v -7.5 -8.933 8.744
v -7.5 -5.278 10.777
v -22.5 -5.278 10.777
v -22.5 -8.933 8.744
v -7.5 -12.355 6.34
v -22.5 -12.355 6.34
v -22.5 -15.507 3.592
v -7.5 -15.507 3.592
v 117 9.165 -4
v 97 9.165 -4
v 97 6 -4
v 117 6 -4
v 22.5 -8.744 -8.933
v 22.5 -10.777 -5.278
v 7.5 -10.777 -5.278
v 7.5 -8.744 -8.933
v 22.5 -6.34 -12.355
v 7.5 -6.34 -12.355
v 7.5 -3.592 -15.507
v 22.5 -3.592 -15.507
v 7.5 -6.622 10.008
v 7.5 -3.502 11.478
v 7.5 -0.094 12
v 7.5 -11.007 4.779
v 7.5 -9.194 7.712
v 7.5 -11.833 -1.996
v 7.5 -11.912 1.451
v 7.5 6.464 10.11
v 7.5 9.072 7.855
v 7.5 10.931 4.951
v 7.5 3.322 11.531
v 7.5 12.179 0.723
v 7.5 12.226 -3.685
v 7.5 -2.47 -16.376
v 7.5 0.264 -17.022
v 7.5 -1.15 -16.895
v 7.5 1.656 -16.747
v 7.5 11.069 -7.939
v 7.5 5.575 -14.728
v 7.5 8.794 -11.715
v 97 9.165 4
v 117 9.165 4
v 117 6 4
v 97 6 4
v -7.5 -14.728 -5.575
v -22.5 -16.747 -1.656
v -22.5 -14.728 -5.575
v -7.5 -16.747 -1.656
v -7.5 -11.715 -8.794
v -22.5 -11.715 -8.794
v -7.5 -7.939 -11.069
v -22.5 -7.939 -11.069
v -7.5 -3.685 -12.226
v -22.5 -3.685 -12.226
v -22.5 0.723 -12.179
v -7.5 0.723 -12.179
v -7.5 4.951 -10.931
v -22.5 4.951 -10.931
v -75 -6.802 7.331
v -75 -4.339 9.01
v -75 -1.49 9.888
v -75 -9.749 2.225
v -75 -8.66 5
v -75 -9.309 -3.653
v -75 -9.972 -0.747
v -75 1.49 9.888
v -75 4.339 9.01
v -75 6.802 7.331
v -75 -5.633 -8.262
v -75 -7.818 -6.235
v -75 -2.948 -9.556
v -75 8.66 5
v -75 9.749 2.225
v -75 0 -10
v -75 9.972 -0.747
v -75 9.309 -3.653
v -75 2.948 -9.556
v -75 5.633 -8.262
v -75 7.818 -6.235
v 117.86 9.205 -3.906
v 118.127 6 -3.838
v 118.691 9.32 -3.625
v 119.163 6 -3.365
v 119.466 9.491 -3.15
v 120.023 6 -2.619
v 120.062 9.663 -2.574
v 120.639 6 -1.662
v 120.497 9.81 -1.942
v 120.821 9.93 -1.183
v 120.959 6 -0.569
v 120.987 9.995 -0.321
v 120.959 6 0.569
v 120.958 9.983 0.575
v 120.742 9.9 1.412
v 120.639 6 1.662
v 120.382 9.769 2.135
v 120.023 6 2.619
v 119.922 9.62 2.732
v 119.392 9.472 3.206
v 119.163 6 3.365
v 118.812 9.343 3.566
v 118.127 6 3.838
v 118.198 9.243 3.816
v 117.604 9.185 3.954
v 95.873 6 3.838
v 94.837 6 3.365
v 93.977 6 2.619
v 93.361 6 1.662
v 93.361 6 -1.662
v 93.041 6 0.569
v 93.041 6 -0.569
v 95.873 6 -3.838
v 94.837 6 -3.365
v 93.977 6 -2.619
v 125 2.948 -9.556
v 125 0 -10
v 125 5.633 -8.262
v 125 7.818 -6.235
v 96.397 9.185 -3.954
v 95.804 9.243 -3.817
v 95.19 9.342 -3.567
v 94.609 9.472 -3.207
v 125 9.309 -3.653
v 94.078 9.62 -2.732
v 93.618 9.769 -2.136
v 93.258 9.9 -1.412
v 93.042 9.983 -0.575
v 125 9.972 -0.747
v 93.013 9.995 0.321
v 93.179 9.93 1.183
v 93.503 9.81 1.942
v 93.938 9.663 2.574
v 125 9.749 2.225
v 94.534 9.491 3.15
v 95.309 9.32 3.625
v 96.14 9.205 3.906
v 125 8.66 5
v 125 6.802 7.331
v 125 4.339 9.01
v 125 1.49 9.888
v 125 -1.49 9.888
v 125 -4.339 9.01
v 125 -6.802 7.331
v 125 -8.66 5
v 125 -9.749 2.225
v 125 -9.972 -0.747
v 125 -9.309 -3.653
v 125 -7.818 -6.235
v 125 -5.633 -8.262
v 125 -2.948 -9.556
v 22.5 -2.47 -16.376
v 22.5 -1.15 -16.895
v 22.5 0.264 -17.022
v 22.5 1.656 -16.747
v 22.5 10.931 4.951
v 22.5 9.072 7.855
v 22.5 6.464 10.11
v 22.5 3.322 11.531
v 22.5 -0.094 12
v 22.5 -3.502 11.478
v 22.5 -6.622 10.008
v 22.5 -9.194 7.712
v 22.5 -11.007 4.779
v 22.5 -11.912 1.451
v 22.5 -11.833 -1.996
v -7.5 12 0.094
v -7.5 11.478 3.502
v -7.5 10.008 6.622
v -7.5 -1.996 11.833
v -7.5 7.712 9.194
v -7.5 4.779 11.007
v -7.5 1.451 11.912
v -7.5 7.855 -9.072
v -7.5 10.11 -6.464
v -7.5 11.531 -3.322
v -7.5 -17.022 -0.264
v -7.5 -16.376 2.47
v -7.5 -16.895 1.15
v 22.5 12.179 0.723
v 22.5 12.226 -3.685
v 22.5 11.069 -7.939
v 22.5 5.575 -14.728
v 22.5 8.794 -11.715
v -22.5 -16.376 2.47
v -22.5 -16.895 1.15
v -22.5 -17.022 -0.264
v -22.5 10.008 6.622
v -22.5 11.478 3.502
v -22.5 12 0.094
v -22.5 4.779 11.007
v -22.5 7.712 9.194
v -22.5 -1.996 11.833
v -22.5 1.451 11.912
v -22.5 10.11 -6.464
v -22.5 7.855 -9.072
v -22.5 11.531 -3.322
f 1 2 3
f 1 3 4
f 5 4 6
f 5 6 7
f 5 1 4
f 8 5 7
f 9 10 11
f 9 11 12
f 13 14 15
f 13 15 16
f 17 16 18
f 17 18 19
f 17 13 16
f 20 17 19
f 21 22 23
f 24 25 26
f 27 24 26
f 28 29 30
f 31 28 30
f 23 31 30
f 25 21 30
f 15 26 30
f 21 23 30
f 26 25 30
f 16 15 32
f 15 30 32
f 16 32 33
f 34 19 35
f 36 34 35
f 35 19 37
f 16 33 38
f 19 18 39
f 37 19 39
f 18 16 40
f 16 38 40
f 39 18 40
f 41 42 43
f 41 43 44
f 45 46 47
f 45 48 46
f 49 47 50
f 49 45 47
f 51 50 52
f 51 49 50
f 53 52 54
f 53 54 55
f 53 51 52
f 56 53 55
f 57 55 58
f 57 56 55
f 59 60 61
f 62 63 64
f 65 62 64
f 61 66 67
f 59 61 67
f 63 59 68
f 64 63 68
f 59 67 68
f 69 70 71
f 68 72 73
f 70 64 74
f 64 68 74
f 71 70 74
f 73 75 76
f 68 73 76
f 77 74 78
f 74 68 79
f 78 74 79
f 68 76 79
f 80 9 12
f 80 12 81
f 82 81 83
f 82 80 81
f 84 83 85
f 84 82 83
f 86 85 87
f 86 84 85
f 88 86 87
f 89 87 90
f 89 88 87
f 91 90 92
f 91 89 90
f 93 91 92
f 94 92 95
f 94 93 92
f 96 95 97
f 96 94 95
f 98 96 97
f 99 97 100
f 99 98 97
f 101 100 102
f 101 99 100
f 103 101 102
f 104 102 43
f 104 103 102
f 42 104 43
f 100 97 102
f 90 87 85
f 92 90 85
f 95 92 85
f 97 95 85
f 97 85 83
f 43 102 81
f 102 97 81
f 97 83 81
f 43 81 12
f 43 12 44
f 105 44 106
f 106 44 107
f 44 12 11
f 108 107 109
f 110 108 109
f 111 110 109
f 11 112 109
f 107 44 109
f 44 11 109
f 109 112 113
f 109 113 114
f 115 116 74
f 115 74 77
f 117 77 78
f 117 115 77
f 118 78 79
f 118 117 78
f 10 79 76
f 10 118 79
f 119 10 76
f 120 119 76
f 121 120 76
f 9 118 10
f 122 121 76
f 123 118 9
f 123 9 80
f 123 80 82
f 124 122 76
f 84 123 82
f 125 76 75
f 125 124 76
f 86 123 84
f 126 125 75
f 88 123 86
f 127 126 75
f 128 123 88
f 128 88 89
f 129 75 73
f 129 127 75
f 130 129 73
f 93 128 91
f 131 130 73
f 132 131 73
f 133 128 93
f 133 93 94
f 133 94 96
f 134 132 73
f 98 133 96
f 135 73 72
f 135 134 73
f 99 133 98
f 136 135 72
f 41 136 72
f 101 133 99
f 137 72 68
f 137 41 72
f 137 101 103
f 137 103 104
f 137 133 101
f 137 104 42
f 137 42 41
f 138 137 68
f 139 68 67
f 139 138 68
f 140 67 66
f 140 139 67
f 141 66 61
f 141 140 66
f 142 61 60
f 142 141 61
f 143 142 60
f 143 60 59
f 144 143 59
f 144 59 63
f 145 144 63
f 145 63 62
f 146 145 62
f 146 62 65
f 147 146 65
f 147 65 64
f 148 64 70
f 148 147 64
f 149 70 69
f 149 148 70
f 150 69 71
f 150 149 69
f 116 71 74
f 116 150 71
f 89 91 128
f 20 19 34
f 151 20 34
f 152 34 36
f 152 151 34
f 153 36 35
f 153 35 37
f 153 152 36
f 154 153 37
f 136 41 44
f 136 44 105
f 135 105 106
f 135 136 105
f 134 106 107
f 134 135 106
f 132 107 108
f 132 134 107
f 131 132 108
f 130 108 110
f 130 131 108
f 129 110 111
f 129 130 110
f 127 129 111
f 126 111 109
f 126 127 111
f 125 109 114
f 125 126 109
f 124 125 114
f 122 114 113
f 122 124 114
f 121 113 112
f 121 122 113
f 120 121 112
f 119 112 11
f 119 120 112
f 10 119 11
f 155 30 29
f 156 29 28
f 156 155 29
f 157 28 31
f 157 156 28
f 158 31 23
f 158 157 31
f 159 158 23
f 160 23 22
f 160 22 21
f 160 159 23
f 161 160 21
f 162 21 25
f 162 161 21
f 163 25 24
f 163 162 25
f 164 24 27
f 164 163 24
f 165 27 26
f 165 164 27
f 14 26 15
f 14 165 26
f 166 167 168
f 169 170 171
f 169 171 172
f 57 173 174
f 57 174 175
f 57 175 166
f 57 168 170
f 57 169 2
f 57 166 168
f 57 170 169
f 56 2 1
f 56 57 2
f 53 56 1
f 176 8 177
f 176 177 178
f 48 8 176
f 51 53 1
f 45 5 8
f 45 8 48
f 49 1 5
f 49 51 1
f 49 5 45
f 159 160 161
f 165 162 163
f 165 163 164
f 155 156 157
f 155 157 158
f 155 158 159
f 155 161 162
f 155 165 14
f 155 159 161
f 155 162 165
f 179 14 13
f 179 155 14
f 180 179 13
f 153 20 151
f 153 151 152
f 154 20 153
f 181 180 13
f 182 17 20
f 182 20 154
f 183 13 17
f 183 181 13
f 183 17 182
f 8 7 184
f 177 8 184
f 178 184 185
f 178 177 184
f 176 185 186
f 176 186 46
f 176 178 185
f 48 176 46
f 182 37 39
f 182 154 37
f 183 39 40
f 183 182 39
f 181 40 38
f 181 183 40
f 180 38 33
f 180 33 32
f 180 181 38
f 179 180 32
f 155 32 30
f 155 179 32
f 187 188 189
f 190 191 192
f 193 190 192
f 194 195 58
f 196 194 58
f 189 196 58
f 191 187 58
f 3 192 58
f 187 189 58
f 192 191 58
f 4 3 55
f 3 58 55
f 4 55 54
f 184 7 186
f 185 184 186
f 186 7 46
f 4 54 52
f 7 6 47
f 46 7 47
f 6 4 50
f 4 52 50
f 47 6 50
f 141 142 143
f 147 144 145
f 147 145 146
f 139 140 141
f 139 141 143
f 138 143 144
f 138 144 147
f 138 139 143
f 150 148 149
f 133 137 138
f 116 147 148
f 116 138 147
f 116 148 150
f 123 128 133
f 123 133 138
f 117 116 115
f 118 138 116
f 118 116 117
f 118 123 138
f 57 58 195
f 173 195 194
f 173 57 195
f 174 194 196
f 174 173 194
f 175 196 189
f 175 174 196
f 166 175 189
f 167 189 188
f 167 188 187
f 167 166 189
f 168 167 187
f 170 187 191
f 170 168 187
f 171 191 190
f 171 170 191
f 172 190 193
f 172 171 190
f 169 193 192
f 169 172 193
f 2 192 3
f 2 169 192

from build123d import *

# Parameters (mm, degrees)
SKETCH1_R                = 10
BOSS_EXTRUDE1_DEPTH      = 125
BOSS_EXTRUDE1_DEPTH_BACK = 75
BOSS_EXTRUDE2_START      = 15
BOSS_EXTRUDE2_DEPTH      = 7.5
LPATTERN1_COUNT          = 2
LPATTERN1_PITCH          = 30
BODY_MOVE_COPY1_ANGLE    = 90
CUT_EXTRUDE1_DEPTH       = 4


with BuildPart() as part:
    # Sketch1 → Boss-Extrude1 (new body, two sides)
    with BuildSketch(Plane(origin=(0, 0, 0), x_dir=(0, 0, -1), z_dir=(1, 0, 0))) as boss_extrude1_sk:
        Circle(SKETCH1_R)
    extrude(amount=BOSS_EXTRUDE1_DEPTH)
    extrude(boss_extrude1_sk.sketch, amount=-BOSS_EXTRUDE1_DEPTH_BACK)

    # Sketch3 → Cut-Extrude1 (cut)
    with BuildSketch(Plane(origin=(0, 10, 0), x_dir=(1, 0, 0), z_dir=(0, 1, 0))):
        with BuildLine():
            Line((97, 4), (117, 4))
            ThreePointArc((117, 4), (121, 0), (117, -4))
            Line((117, -4), (97, -4))
            ThreePointArc((97, -4), (93, 0), (97, 4))
        make_face()
    extrude(amount=-CUT_EXTRUDE1_DEPTH, mode=Mode.SUBTRACT)


with BuildPart() as body_2:
    # Sketch2 → Boss-Extrude2 (new body, symmetric)
    with BuildSketch(Plane(origin=(0, 0, 0), x_dir=(0, 0, -1), z_dir=(1, 0, 0)).offset(BOSS_EXTRUDE2_START)):
        with BuildLine():
            ThreePointArc((-4.950818385, 10.931120589), (-10.855235073, -5.115063196), (5.27814522, -10.776881879))
            ThreePointArc((5.27814522, -10.776881879), (10.675009162, -7.586625818), (15.507108825, -3.59229396))
            ThreePointArc((15.507108825, -3.59229396), (16.895326586, -1.149524968), (16.746983201, 1.656230392))
            ThreePointArc((16.746983201, 1.656230392), (7.939134659, 11.068540296), (-4.950818385, 10.931120589))
        make_face()
    boss_extrude2 = extrude(amount=BOSS_EXTRUDE2_DEPTH, both=True)


with BuildPart() as lpattern1_1:
    # LPattern1: Boss-Extrude2 ×2
    with Locations(*[(-i * LPATTERN1_PITCH, 0, 0) for i in range(1, LPATTERN1_COUNT)]):
        add(boss_extrude2)


with BuildPart() as lpattern1_1_1:
    # Body-Move/Copy1: moved
    add(lpattern1_1.part.rotate(Axis((0, 0, 0), (-1, 0, 0)), BODY_MOVE_COPY1_ANGLE))


solid = Compound([part.part, body_2.part, lpattern1_1_1.part])
